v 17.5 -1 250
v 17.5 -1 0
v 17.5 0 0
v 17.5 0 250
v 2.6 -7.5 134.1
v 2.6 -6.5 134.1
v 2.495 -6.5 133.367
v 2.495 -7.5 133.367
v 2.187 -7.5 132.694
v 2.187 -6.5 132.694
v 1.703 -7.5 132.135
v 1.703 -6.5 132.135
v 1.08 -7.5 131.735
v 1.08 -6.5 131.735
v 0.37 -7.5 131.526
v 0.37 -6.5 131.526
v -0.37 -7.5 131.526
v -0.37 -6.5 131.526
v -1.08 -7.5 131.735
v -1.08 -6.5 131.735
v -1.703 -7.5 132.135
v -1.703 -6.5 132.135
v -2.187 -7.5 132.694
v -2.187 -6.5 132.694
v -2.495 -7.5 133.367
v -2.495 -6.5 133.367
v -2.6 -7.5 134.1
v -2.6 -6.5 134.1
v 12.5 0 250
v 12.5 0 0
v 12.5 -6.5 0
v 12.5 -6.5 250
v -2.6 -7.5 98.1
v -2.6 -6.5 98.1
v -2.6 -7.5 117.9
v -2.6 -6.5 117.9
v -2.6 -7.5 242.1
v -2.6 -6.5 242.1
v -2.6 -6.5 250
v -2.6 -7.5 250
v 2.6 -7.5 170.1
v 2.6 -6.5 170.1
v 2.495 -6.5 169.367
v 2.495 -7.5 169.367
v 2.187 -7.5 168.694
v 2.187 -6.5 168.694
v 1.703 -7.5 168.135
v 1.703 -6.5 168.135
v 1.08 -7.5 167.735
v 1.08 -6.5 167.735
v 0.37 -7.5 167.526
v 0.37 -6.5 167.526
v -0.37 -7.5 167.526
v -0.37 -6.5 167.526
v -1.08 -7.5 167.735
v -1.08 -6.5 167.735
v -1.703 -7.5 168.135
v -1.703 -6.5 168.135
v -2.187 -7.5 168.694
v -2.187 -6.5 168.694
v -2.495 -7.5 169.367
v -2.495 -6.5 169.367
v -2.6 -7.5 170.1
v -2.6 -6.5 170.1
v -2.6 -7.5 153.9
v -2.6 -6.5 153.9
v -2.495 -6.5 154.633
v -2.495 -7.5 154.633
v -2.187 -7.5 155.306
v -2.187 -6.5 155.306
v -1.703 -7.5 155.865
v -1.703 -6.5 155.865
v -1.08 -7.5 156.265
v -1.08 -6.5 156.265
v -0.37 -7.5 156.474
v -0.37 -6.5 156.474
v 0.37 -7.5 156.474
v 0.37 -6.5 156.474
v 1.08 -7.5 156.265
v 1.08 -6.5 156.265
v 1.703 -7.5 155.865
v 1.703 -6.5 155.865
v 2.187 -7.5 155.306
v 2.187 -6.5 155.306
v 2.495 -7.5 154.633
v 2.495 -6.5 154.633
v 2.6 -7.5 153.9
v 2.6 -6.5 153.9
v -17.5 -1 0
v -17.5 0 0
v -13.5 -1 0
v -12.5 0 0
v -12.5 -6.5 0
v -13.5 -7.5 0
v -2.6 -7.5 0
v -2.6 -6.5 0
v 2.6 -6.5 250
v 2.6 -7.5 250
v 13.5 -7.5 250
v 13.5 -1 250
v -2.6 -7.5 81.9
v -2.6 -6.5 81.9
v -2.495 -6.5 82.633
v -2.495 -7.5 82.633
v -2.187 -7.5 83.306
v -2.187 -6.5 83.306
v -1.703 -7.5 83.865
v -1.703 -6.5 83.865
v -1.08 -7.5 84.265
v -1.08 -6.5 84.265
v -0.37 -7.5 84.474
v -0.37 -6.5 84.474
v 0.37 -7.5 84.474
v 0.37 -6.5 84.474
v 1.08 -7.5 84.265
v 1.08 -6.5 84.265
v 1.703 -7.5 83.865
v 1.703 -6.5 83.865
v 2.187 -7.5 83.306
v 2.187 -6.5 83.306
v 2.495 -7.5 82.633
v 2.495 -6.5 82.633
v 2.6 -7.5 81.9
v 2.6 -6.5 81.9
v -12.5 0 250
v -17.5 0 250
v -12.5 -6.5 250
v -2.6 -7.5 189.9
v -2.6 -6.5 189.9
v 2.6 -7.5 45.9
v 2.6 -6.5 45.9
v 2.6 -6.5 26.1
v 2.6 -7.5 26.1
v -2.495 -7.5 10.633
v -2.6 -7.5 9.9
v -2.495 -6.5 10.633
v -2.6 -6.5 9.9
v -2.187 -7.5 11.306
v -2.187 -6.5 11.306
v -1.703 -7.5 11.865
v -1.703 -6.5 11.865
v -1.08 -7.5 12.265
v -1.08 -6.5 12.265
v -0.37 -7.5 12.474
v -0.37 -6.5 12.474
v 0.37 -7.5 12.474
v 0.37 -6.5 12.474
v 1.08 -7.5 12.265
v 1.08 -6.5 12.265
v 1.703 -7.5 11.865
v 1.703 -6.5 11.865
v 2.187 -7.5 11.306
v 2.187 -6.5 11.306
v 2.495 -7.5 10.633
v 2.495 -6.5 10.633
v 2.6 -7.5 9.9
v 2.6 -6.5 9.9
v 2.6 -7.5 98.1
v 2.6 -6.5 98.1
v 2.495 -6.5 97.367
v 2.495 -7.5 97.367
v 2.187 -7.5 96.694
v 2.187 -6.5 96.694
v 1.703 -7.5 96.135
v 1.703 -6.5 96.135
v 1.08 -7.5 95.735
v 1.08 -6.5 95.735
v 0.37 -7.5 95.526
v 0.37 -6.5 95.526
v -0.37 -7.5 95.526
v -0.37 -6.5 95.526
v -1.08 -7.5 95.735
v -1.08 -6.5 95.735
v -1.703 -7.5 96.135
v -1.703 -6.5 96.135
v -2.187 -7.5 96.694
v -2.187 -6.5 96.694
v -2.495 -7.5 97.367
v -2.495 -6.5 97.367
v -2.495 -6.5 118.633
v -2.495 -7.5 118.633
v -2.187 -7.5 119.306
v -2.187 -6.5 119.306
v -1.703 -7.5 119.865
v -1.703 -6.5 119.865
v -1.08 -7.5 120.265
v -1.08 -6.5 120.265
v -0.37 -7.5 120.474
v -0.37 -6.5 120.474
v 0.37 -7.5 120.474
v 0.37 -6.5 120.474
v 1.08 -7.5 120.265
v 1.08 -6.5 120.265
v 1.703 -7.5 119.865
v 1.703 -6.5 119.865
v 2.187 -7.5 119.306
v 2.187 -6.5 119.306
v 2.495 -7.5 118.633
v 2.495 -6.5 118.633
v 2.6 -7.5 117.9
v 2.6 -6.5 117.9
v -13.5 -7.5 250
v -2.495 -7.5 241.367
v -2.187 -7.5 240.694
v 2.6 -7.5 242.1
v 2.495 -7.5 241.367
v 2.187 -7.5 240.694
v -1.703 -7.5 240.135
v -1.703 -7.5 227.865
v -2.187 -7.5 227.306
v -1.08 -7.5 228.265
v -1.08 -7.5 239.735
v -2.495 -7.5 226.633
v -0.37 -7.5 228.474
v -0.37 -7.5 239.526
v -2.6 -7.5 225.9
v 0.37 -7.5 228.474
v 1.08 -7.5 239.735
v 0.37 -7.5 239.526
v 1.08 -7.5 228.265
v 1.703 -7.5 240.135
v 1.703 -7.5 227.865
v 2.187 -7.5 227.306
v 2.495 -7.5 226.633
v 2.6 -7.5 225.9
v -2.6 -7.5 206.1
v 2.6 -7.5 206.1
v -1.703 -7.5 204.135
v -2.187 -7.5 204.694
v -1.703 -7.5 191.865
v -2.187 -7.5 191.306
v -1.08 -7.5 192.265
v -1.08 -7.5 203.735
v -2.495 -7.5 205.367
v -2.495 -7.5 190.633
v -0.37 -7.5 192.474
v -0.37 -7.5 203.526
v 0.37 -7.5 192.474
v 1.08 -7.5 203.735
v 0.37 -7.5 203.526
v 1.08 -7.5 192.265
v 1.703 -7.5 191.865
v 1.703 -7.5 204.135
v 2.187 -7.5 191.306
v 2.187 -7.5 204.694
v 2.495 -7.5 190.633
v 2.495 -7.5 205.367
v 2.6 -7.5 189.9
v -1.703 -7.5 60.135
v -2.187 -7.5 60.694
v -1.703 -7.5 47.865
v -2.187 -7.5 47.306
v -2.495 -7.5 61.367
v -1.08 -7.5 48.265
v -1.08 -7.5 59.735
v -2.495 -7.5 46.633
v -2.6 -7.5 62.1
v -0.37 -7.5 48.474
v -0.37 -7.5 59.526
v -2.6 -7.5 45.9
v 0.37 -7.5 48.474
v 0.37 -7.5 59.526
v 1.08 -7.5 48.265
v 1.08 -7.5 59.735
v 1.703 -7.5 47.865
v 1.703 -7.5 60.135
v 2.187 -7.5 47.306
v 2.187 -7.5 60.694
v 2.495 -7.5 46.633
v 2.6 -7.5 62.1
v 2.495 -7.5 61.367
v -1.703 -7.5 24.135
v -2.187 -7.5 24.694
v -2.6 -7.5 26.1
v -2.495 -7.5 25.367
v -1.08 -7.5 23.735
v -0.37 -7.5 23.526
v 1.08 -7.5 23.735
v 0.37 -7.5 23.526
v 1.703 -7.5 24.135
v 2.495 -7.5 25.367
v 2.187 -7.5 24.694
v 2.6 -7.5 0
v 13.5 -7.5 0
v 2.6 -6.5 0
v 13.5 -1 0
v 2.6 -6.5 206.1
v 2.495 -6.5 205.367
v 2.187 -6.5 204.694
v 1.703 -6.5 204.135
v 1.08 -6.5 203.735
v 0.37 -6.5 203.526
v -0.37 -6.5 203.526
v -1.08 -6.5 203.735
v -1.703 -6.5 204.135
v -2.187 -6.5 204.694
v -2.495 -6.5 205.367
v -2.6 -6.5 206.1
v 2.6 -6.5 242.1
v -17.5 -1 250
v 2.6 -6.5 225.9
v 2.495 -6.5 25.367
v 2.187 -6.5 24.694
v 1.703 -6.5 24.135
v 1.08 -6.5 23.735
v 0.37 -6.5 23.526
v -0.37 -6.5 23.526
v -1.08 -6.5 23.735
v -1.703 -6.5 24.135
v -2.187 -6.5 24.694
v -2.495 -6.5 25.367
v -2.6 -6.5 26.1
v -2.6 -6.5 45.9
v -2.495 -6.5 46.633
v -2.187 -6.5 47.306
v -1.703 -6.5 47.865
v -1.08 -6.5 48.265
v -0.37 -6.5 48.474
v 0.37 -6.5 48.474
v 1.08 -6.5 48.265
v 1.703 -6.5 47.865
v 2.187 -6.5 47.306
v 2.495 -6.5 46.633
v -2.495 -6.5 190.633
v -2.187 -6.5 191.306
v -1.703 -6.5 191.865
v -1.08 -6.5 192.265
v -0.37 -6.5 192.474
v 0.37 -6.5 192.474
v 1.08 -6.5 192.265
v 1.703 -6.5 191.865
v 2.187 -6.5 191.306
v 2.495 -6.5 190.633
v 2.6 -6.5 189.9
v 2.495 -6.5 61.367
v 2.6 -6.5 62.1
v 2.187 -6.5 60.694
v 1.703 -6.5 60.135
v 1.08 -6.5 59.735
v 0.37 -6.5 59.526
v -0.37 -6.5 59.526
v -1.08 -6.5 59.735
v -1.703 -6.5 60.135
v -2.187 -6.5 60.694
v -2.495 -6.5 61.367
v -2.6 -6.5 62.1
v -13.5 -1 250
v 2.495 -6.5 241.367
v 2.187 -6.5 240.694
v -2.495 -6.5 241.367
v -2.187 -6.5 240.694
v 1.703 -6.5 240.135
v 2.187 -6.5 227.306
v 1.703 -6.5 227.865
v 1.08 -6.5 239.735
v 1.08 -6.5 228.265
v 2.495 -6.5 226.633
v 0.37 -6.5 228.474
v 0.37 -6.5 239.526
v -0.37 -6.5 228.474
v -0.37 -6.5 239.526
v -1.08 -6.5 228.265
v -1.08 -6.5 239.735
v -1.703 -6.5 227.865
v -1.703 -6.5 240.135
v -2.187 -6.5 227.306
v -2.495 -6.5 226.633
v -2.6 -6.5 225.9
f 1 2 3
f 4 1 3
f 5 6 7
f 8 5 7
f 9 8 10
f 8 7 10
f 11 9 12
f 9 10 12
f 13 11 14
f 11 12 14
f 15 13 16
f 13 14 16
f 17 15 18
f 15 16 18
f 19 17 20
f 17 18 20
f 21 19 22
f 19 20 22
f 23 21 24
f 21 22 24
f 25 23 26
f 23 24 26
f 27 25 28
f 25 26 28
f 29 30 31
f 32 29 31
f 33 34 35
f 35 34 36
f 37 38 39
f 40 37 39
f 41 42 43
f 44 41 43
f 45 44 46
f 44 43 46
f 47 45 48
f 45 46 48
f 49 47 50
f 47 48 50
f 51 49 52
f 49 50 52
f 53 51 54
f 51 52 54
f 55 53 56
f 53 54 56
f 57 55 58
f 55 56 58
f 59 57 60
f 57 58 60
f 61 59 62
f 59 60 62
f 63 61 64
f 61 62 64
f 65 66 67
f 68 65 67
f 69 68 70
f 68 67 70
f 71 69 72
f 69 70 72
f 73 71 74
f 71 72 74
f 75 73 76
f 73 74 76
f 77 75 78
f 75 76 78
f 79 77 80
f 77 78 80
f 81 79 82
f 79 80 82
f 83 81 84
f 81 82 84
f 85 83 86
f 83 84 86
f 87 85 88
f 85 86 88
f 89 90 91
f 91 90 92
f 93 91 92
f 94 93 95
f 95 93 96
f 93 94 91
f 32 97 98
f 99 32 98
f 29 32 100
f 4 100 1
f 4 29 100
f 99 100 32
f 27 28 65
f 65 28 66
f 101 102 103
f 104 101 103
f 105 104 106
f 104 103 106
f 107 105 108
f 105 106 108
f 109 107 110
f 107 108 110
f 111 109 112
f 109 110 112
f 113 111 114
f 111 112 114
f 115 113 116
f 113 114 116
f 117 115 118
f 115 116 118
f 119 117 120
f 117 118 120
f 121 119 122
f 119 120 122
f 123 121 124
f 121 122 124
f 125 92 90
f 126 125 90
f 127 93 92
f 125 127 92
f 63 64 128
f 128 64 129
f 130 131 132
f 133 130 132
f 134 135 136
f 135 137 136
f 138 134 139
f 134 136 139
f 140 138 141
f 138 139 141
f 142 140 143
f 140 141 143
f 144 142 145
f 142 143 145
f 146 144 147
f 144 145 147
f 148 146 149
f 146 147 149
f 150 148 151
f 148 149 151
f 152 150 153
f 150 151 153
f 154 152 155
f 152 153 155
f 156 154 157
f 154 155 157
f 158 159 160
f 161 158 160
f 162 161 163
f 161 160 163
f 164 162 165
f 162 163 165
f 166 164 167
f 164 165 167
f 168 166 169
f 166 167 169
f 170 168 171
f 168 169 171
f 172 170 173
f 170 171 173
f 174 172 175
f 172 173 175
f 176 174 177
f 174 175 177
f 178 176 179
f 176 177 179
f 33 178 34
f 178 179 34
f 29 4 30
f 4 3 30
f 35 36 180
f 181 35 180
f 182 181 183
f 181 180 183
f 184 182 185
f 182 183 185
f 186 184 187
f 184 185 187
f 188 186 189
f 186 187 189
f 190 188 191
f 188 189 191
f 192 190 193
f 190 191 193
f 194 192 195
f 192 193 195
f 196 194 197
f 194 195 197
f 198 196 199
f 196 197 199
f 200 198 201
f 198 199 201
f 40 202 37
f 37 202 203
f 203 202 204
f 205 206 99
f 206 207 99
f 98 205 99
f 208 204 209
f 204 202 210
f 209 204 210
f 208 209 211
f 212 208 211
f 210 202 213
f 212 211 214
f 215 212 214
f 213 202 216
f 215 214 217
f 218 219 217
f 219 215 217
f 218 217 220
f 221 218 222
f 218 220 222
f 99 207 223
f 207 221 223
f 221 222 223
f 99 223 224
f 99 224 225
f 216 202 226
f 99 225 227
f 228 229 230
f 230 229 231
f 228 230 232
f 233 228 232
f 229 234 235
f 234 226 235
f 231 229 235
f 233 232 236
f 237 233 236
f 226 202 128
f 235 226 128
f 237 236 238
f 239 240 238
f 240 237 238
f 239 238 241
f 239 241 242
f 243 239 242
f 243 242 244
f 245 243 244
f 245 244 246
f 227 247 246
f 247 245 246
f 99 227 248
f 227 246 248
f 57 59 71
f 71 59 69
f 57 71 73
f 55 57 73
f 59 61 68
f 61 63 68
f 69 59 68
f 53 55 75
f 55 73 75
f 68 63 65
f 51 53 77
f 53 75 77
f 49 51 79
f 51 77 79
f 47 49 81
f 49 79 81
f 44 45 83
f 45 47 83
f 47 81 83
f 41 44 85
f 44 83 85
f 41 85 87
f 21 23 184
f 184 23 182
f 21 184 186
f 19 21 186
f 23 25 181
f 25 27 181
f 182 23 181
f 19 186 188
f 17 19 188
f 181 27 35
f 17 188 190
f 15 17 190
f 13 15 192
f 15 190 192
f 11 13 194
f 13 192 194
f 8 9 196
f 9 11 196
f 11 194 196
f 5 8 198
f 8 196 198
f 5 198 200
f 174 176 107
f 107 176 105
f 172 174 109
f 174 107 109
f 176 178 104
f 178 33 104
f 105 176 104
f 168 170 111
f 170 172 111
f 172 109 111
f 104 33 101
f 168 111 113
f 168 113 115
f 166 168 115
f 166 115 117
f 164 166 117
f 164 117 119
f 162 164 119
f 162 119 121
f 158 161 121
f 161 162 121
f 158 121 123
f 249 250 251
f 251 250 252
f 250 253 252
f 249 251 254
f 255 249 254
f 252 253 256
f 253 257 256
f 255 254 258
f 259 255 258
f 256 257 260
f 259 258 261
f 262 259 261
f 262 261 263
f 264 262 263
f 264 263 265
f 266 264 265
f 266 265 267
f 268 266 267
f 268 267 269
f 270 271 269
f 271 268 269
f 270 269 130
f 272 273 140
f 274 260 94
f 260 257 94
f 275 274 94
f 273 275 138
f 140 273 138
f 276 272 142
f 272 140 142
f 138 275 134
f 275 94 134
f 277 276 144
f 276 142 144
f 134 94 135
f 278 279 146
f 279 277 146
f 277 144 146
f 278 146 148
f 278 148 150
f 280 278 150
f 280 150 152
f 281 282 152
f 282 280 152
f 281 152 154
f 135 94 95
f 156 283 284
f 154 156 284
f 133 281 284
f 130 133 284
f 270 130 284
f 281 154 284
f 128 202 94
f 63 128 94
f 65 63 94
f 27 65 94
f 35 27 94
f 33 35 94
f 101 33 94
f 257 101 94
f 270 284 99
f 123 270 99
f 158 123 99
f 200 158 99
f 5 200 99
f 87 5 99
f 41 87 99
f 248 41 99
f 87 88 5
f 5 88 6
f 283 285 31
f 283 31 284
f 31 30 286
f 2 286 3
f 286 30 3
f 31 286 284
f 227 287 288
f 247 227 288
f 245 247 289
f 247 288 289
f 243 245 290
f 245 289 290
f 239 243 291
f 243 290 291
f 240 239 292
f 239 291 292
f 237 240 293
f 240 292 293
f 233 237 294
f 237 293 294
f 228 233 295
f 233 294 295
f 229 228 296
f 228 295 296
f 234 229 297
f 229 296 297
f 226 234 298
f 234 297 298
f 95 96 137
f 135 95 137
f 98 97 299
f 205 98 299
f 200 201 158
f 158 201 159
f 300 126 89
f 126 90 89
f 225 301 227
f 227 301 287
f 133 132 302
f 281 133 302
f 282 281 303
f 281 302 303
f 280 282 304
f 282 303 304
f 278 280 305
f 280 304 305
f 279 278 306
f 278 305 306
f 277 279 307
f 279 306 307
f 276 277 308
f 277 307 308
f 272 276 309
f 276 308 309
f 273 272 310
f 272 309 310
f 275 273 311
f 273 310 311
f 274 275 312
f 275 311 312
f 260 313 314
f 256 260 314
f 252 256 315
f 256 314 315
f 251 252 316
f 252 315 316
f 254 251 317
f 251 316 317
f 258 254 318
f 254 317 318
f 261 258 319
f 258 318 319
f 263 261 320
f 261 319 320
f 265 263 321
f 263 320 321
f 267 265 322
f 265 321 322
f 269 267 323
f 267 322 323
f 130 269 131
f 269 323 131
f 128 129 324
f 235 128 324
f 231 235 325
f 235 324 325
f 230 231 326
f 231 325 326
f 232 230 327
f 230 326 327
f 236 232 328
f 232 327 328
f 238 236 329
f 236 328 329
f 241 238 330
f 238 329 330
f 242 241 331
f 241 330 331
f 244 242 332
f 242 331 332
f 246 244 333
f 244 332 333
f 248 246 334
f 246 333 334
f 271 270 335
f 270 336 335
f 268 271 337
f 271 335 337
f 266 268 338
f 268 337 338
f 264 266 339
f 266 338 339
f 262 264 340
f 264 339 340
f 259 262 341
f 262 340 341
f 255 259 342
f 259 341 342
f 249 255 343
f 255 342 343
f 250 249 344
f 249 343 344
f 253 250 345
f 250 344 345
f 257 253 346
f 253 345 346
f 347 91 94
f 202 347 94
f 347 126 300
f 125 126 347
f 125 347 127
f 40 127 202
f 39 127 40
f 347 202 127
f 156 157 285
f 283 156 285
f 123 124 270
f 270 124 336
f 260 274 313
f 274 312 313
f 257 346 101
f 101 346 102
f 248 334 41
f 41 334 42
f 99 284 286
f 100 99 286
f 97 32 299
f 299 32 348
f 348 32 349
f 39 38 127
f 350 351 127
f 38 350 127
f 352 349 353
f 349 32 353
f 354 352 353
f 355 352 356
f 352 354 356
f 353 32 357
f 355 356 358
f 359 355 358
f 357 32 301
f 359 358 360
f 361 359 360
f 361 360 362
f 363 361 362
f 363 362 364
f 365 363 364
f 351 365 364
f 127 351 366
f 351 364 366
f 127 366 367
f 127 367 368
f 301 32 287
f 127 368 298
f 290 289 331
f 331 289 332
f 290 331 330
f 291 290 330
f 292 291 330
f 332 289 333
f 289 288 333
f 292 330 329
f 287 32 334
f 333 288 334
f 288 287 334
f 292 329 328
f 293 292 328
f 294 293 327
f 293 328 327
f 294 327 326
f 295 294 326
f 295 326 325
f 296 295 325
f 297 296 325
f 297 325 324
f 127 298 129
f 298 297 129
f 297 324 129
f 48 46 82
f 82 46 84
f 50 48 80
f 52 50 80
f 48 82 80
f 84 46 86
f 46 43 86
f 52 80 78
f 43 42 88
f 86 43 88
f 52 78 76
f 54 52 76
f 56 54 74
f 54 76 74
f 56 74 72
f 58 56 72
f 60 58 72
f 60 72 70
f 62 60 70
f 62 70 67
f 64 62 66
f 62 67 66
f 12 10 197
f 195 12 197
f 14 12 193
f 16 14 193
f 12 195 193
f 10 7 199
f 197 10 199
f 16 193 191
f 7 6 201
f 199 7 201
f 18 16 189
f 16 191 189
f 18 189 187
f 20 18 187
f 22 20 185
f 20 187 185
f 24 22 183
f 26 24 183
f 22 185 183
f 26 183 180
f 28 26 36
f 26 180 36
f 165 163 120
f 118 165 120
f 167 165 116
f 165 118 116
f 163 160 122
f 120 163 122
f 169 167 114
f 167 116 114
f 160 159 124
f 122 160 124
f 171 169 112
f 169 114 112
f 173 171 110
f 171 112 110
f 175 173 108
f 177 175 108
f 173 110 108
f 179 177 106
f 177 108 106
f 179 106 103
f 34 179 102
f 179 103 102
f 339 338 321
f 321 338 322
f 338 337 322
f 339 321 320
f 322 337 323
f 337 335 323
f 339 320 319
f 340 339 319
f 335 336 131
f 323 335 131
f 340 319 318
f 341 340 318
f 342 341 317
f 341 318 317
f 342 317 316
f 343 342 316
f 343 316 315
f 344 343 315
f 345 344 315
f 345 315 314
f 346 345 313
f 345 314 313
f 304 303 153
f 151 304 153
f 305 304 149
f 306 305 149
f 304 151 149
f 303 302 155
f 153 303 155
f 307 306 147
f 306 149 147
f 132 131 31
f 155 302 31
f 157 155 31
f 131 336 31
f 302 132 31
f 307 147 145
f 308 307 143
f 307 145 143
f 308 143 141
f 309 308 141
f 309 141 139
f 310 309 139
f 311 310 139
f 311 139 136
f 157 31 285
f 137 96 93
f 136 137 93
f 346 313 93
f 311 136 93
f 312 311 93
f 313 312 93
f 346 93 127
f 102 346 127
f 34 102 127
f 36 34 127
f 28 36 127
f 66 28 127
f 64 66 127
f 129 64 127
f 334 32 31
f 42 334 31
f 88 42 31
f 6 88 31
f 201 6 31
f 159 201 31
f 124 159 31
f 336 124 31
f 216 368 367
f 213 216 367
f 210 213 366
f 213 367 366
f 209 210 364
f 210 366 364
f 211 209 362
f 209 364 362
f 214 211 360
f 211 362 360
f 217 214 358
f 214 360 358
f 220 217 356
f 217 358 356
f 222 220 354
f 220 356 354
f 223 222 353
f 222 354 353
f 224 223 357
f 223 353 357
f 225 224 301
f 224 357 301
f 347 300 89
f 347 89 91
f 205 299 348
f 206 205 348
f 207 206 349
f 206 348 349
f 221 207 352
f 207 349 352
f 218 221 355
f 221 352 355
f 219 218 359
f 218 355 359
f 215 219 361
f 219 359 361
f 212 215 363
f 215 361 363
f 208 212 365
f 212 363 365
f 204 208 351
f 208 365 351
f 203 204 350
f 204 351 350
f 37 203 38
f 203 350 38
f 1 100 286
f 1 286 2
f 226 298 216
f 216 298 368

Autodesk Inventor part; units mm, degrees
ref_plane "YZ Plane" through (0, 0, 0) normal (1, 0, 0) x (0, 1, 0)
ref_plane "XZ Plane" through (0, 0, 0) normal (0, 1, 0) x (-1, 0, 0)
ref_plane "XY Plane" through (0, 0, 0) normal (0, 0, 1) x (1, 0, 0)
sketch "Skizze_1" plane through (0, 0, 0) normal (0, 0, 1) x (1, 0, 0)
  line L0 (-17.5, 0) -> (-17.5, -1)
  line L1 (-17.5, -1) -> (-13.5, -1)
  line L2 (-13.5, -1) -> (-13.5, -7.5)
  line L3 (-13.5, -7.5) -> (13.5, -7.5)
  line L4 (13.5, -7.5) -> (13.5, -1)
  line L5 (13.5, -1) -> (17.5, -1)
  line L6 (17.5, -1) -> (17.5, 0)
  line L7 (17.5, 0) -> (12.5, 0)
  line L8 (12.5, 0) -> (12.5, -6.5)
  line L9 (12.5, -6.5) -> (-12.5, -6.5)
  line L10 (-12.5, -6.5) -> (-12.5, 0)
  line L11 (-12.5, 0) -> (-17.5, 0)
extrude "Extrusion1" add sketch "Skizze_1" along normal blind 250
sketch "sketch_roundrect_1" plane through (0, 0, 0) normal (0, 1, 0) x (-1, 0, 0)
  arc A0 (2.6, 9.9) -> (-2.6, 9.9) centre (0, 9.9) ccw
  line L0 (-2.6, 9.9) -> (-2.6, -9.9)
  arc A1 (-2.6, -9.9) -> (2.6, -9.9) centre (0, -9.9) ccw
  line L1 (2.6, -9.9) -> (2.6, 9.9)
extrude "Extrusion2" cut sketch "sketch_roundrect_1" against normal blind 50
sketch "sketch_roundrect_2" plane through (0, 0, 0) normal (0, 1, 0) x (-1, 0, 0)
  arc A0 (2.6, 45.9) -> (-2.6, 45.9) centre (0, 45.9) ccw
  line L0 (-2.6, 45.9) -> (-2.6, 26.1)
  arc A1 (-2.6, 26.1) -> (2.6, 26.1) centre (0, 26.1) ccw
  line L1 (2.6, 26.1) -> (2.6, 45.9)
extrude "Extrusion3" cut sketch "sketch_roundrect_2" against normal blind 50
sketch "sketch_roundrect_3" plane through (0, 0, 0) normal (0, 1, 0) x (-1, 0, 0)
  arc A0 (2.6, 81.9) -> (-2.6, 81.9) centre (0, 81.9) ccw
  line L0 (-2.6, 81.9) -> (-2.6, 62.1)
  arc A1 (-2.6, 62.1) -> (2.6, 62.1) centre (0, 62.1) ccw
  line L1 (2.6, 62.1) -> (2.6, 81.9)
extrude "Extrusion4" cut sketch "sketch_roundrect_3" against normal blind 50
sketch "sketch_roundrect_4" plane through (0, 0, 0) normal (0, 1, 0) x (-1, 0, 0)
  arc A0 (2.6, 117.9) -> (-2.6, 117.9) centre (0, 117.9) ccw
  line L0 (-2.6, 117.9) -> (-2.6, 98.1)
  arc A1 (-2.6, 98.1) -> (2.6, 98.1) centre (0, 98.1) ccw
  line L1 (2.6, 98.1) -> (2.6, 117.9)
extrude "Extrusion5" cut sketch "sketch_roundrect_4" against normal blind 50
sketch "sketch_roundrect_5" plane through (0, 0, 0) normal (0, 1, 0) x (-1, 0, 0)
  arc A0 (2.6, 153.9) -> (-2.6, 153.9) centre (0, 153.9) ccw
  line L0 (-2.6, 153.9) -> (-2.6, 134.1)
  arc A1 (-2.6, 134.1) -> (2.6, 134.1) centre (0, 134.1) ccw
  line L1 (2.6, 134.1) -> (2.6, 153.9)
extrude "Extrusion6" cut sketch "sketch_roundrect_5" against normal blind 50
sketch "sketch_roundrect_6" plane through (0, 0, 0) normal (0, 1, 0) x (-1, 0, 0)
  arc A0 (2.6, 189.9) -> (-2.6, 189.9) centre (0, 189.9) ccw
  line L0 (-2.6, 189.9) -> (-2.6, 170.1)
  arc A1 (-2.6, 170.1) -> (2.6, 170.1) centre (0, 170.1) ccw
  line L1 (2.6, 170.1) -> (2.6, 189.9)
extrude "Extrusion7" cut sketch "sketch_roundrect_6" against normal blind 50
sketch "sketch_roundrect_7" plane through (0, 0, 0) normal (0, 1, 0) x (-1, 0, 0)
  arc A0 (2.6, 225.9) -> (-2.6, 225.9) centre (0, 225.9) ccw
  line L0 (-2.6, 225.9) -> (-2.6, 206.1)
  arc A1 (-2.6, 206.1) -> (2.6, 206.1) centre (0, 206.1) ccw
  line L1 (2.6, 206.1) -> (2.6, 225.9)
extrude "Extrusion8" cut sketch "sketch_roundrect_7" against normal blind 50
sketch "sketch_roundrect_8" plane through (0, 0, 0) normal (0, 1, 0) x (-1, 0, 0)
  arc A0 (2.6, 261.9) -> (-2.6, 261.9) centre (0, 261.9) ccw
  line L0 (-2.6, 261.9) -> (-2.6, 242.1)
  arc A1 (-2.6, 242.1) -> (2.6, 242.1) centre (0, 242.1) ccw
  line L1 (2.6, 242.1) -> (2.6, 261.9)
extrude "Extrusion9" cut sketch "sketch_roundrect_8" against normal blind 50
properties part number "WAGO_210-112250"
